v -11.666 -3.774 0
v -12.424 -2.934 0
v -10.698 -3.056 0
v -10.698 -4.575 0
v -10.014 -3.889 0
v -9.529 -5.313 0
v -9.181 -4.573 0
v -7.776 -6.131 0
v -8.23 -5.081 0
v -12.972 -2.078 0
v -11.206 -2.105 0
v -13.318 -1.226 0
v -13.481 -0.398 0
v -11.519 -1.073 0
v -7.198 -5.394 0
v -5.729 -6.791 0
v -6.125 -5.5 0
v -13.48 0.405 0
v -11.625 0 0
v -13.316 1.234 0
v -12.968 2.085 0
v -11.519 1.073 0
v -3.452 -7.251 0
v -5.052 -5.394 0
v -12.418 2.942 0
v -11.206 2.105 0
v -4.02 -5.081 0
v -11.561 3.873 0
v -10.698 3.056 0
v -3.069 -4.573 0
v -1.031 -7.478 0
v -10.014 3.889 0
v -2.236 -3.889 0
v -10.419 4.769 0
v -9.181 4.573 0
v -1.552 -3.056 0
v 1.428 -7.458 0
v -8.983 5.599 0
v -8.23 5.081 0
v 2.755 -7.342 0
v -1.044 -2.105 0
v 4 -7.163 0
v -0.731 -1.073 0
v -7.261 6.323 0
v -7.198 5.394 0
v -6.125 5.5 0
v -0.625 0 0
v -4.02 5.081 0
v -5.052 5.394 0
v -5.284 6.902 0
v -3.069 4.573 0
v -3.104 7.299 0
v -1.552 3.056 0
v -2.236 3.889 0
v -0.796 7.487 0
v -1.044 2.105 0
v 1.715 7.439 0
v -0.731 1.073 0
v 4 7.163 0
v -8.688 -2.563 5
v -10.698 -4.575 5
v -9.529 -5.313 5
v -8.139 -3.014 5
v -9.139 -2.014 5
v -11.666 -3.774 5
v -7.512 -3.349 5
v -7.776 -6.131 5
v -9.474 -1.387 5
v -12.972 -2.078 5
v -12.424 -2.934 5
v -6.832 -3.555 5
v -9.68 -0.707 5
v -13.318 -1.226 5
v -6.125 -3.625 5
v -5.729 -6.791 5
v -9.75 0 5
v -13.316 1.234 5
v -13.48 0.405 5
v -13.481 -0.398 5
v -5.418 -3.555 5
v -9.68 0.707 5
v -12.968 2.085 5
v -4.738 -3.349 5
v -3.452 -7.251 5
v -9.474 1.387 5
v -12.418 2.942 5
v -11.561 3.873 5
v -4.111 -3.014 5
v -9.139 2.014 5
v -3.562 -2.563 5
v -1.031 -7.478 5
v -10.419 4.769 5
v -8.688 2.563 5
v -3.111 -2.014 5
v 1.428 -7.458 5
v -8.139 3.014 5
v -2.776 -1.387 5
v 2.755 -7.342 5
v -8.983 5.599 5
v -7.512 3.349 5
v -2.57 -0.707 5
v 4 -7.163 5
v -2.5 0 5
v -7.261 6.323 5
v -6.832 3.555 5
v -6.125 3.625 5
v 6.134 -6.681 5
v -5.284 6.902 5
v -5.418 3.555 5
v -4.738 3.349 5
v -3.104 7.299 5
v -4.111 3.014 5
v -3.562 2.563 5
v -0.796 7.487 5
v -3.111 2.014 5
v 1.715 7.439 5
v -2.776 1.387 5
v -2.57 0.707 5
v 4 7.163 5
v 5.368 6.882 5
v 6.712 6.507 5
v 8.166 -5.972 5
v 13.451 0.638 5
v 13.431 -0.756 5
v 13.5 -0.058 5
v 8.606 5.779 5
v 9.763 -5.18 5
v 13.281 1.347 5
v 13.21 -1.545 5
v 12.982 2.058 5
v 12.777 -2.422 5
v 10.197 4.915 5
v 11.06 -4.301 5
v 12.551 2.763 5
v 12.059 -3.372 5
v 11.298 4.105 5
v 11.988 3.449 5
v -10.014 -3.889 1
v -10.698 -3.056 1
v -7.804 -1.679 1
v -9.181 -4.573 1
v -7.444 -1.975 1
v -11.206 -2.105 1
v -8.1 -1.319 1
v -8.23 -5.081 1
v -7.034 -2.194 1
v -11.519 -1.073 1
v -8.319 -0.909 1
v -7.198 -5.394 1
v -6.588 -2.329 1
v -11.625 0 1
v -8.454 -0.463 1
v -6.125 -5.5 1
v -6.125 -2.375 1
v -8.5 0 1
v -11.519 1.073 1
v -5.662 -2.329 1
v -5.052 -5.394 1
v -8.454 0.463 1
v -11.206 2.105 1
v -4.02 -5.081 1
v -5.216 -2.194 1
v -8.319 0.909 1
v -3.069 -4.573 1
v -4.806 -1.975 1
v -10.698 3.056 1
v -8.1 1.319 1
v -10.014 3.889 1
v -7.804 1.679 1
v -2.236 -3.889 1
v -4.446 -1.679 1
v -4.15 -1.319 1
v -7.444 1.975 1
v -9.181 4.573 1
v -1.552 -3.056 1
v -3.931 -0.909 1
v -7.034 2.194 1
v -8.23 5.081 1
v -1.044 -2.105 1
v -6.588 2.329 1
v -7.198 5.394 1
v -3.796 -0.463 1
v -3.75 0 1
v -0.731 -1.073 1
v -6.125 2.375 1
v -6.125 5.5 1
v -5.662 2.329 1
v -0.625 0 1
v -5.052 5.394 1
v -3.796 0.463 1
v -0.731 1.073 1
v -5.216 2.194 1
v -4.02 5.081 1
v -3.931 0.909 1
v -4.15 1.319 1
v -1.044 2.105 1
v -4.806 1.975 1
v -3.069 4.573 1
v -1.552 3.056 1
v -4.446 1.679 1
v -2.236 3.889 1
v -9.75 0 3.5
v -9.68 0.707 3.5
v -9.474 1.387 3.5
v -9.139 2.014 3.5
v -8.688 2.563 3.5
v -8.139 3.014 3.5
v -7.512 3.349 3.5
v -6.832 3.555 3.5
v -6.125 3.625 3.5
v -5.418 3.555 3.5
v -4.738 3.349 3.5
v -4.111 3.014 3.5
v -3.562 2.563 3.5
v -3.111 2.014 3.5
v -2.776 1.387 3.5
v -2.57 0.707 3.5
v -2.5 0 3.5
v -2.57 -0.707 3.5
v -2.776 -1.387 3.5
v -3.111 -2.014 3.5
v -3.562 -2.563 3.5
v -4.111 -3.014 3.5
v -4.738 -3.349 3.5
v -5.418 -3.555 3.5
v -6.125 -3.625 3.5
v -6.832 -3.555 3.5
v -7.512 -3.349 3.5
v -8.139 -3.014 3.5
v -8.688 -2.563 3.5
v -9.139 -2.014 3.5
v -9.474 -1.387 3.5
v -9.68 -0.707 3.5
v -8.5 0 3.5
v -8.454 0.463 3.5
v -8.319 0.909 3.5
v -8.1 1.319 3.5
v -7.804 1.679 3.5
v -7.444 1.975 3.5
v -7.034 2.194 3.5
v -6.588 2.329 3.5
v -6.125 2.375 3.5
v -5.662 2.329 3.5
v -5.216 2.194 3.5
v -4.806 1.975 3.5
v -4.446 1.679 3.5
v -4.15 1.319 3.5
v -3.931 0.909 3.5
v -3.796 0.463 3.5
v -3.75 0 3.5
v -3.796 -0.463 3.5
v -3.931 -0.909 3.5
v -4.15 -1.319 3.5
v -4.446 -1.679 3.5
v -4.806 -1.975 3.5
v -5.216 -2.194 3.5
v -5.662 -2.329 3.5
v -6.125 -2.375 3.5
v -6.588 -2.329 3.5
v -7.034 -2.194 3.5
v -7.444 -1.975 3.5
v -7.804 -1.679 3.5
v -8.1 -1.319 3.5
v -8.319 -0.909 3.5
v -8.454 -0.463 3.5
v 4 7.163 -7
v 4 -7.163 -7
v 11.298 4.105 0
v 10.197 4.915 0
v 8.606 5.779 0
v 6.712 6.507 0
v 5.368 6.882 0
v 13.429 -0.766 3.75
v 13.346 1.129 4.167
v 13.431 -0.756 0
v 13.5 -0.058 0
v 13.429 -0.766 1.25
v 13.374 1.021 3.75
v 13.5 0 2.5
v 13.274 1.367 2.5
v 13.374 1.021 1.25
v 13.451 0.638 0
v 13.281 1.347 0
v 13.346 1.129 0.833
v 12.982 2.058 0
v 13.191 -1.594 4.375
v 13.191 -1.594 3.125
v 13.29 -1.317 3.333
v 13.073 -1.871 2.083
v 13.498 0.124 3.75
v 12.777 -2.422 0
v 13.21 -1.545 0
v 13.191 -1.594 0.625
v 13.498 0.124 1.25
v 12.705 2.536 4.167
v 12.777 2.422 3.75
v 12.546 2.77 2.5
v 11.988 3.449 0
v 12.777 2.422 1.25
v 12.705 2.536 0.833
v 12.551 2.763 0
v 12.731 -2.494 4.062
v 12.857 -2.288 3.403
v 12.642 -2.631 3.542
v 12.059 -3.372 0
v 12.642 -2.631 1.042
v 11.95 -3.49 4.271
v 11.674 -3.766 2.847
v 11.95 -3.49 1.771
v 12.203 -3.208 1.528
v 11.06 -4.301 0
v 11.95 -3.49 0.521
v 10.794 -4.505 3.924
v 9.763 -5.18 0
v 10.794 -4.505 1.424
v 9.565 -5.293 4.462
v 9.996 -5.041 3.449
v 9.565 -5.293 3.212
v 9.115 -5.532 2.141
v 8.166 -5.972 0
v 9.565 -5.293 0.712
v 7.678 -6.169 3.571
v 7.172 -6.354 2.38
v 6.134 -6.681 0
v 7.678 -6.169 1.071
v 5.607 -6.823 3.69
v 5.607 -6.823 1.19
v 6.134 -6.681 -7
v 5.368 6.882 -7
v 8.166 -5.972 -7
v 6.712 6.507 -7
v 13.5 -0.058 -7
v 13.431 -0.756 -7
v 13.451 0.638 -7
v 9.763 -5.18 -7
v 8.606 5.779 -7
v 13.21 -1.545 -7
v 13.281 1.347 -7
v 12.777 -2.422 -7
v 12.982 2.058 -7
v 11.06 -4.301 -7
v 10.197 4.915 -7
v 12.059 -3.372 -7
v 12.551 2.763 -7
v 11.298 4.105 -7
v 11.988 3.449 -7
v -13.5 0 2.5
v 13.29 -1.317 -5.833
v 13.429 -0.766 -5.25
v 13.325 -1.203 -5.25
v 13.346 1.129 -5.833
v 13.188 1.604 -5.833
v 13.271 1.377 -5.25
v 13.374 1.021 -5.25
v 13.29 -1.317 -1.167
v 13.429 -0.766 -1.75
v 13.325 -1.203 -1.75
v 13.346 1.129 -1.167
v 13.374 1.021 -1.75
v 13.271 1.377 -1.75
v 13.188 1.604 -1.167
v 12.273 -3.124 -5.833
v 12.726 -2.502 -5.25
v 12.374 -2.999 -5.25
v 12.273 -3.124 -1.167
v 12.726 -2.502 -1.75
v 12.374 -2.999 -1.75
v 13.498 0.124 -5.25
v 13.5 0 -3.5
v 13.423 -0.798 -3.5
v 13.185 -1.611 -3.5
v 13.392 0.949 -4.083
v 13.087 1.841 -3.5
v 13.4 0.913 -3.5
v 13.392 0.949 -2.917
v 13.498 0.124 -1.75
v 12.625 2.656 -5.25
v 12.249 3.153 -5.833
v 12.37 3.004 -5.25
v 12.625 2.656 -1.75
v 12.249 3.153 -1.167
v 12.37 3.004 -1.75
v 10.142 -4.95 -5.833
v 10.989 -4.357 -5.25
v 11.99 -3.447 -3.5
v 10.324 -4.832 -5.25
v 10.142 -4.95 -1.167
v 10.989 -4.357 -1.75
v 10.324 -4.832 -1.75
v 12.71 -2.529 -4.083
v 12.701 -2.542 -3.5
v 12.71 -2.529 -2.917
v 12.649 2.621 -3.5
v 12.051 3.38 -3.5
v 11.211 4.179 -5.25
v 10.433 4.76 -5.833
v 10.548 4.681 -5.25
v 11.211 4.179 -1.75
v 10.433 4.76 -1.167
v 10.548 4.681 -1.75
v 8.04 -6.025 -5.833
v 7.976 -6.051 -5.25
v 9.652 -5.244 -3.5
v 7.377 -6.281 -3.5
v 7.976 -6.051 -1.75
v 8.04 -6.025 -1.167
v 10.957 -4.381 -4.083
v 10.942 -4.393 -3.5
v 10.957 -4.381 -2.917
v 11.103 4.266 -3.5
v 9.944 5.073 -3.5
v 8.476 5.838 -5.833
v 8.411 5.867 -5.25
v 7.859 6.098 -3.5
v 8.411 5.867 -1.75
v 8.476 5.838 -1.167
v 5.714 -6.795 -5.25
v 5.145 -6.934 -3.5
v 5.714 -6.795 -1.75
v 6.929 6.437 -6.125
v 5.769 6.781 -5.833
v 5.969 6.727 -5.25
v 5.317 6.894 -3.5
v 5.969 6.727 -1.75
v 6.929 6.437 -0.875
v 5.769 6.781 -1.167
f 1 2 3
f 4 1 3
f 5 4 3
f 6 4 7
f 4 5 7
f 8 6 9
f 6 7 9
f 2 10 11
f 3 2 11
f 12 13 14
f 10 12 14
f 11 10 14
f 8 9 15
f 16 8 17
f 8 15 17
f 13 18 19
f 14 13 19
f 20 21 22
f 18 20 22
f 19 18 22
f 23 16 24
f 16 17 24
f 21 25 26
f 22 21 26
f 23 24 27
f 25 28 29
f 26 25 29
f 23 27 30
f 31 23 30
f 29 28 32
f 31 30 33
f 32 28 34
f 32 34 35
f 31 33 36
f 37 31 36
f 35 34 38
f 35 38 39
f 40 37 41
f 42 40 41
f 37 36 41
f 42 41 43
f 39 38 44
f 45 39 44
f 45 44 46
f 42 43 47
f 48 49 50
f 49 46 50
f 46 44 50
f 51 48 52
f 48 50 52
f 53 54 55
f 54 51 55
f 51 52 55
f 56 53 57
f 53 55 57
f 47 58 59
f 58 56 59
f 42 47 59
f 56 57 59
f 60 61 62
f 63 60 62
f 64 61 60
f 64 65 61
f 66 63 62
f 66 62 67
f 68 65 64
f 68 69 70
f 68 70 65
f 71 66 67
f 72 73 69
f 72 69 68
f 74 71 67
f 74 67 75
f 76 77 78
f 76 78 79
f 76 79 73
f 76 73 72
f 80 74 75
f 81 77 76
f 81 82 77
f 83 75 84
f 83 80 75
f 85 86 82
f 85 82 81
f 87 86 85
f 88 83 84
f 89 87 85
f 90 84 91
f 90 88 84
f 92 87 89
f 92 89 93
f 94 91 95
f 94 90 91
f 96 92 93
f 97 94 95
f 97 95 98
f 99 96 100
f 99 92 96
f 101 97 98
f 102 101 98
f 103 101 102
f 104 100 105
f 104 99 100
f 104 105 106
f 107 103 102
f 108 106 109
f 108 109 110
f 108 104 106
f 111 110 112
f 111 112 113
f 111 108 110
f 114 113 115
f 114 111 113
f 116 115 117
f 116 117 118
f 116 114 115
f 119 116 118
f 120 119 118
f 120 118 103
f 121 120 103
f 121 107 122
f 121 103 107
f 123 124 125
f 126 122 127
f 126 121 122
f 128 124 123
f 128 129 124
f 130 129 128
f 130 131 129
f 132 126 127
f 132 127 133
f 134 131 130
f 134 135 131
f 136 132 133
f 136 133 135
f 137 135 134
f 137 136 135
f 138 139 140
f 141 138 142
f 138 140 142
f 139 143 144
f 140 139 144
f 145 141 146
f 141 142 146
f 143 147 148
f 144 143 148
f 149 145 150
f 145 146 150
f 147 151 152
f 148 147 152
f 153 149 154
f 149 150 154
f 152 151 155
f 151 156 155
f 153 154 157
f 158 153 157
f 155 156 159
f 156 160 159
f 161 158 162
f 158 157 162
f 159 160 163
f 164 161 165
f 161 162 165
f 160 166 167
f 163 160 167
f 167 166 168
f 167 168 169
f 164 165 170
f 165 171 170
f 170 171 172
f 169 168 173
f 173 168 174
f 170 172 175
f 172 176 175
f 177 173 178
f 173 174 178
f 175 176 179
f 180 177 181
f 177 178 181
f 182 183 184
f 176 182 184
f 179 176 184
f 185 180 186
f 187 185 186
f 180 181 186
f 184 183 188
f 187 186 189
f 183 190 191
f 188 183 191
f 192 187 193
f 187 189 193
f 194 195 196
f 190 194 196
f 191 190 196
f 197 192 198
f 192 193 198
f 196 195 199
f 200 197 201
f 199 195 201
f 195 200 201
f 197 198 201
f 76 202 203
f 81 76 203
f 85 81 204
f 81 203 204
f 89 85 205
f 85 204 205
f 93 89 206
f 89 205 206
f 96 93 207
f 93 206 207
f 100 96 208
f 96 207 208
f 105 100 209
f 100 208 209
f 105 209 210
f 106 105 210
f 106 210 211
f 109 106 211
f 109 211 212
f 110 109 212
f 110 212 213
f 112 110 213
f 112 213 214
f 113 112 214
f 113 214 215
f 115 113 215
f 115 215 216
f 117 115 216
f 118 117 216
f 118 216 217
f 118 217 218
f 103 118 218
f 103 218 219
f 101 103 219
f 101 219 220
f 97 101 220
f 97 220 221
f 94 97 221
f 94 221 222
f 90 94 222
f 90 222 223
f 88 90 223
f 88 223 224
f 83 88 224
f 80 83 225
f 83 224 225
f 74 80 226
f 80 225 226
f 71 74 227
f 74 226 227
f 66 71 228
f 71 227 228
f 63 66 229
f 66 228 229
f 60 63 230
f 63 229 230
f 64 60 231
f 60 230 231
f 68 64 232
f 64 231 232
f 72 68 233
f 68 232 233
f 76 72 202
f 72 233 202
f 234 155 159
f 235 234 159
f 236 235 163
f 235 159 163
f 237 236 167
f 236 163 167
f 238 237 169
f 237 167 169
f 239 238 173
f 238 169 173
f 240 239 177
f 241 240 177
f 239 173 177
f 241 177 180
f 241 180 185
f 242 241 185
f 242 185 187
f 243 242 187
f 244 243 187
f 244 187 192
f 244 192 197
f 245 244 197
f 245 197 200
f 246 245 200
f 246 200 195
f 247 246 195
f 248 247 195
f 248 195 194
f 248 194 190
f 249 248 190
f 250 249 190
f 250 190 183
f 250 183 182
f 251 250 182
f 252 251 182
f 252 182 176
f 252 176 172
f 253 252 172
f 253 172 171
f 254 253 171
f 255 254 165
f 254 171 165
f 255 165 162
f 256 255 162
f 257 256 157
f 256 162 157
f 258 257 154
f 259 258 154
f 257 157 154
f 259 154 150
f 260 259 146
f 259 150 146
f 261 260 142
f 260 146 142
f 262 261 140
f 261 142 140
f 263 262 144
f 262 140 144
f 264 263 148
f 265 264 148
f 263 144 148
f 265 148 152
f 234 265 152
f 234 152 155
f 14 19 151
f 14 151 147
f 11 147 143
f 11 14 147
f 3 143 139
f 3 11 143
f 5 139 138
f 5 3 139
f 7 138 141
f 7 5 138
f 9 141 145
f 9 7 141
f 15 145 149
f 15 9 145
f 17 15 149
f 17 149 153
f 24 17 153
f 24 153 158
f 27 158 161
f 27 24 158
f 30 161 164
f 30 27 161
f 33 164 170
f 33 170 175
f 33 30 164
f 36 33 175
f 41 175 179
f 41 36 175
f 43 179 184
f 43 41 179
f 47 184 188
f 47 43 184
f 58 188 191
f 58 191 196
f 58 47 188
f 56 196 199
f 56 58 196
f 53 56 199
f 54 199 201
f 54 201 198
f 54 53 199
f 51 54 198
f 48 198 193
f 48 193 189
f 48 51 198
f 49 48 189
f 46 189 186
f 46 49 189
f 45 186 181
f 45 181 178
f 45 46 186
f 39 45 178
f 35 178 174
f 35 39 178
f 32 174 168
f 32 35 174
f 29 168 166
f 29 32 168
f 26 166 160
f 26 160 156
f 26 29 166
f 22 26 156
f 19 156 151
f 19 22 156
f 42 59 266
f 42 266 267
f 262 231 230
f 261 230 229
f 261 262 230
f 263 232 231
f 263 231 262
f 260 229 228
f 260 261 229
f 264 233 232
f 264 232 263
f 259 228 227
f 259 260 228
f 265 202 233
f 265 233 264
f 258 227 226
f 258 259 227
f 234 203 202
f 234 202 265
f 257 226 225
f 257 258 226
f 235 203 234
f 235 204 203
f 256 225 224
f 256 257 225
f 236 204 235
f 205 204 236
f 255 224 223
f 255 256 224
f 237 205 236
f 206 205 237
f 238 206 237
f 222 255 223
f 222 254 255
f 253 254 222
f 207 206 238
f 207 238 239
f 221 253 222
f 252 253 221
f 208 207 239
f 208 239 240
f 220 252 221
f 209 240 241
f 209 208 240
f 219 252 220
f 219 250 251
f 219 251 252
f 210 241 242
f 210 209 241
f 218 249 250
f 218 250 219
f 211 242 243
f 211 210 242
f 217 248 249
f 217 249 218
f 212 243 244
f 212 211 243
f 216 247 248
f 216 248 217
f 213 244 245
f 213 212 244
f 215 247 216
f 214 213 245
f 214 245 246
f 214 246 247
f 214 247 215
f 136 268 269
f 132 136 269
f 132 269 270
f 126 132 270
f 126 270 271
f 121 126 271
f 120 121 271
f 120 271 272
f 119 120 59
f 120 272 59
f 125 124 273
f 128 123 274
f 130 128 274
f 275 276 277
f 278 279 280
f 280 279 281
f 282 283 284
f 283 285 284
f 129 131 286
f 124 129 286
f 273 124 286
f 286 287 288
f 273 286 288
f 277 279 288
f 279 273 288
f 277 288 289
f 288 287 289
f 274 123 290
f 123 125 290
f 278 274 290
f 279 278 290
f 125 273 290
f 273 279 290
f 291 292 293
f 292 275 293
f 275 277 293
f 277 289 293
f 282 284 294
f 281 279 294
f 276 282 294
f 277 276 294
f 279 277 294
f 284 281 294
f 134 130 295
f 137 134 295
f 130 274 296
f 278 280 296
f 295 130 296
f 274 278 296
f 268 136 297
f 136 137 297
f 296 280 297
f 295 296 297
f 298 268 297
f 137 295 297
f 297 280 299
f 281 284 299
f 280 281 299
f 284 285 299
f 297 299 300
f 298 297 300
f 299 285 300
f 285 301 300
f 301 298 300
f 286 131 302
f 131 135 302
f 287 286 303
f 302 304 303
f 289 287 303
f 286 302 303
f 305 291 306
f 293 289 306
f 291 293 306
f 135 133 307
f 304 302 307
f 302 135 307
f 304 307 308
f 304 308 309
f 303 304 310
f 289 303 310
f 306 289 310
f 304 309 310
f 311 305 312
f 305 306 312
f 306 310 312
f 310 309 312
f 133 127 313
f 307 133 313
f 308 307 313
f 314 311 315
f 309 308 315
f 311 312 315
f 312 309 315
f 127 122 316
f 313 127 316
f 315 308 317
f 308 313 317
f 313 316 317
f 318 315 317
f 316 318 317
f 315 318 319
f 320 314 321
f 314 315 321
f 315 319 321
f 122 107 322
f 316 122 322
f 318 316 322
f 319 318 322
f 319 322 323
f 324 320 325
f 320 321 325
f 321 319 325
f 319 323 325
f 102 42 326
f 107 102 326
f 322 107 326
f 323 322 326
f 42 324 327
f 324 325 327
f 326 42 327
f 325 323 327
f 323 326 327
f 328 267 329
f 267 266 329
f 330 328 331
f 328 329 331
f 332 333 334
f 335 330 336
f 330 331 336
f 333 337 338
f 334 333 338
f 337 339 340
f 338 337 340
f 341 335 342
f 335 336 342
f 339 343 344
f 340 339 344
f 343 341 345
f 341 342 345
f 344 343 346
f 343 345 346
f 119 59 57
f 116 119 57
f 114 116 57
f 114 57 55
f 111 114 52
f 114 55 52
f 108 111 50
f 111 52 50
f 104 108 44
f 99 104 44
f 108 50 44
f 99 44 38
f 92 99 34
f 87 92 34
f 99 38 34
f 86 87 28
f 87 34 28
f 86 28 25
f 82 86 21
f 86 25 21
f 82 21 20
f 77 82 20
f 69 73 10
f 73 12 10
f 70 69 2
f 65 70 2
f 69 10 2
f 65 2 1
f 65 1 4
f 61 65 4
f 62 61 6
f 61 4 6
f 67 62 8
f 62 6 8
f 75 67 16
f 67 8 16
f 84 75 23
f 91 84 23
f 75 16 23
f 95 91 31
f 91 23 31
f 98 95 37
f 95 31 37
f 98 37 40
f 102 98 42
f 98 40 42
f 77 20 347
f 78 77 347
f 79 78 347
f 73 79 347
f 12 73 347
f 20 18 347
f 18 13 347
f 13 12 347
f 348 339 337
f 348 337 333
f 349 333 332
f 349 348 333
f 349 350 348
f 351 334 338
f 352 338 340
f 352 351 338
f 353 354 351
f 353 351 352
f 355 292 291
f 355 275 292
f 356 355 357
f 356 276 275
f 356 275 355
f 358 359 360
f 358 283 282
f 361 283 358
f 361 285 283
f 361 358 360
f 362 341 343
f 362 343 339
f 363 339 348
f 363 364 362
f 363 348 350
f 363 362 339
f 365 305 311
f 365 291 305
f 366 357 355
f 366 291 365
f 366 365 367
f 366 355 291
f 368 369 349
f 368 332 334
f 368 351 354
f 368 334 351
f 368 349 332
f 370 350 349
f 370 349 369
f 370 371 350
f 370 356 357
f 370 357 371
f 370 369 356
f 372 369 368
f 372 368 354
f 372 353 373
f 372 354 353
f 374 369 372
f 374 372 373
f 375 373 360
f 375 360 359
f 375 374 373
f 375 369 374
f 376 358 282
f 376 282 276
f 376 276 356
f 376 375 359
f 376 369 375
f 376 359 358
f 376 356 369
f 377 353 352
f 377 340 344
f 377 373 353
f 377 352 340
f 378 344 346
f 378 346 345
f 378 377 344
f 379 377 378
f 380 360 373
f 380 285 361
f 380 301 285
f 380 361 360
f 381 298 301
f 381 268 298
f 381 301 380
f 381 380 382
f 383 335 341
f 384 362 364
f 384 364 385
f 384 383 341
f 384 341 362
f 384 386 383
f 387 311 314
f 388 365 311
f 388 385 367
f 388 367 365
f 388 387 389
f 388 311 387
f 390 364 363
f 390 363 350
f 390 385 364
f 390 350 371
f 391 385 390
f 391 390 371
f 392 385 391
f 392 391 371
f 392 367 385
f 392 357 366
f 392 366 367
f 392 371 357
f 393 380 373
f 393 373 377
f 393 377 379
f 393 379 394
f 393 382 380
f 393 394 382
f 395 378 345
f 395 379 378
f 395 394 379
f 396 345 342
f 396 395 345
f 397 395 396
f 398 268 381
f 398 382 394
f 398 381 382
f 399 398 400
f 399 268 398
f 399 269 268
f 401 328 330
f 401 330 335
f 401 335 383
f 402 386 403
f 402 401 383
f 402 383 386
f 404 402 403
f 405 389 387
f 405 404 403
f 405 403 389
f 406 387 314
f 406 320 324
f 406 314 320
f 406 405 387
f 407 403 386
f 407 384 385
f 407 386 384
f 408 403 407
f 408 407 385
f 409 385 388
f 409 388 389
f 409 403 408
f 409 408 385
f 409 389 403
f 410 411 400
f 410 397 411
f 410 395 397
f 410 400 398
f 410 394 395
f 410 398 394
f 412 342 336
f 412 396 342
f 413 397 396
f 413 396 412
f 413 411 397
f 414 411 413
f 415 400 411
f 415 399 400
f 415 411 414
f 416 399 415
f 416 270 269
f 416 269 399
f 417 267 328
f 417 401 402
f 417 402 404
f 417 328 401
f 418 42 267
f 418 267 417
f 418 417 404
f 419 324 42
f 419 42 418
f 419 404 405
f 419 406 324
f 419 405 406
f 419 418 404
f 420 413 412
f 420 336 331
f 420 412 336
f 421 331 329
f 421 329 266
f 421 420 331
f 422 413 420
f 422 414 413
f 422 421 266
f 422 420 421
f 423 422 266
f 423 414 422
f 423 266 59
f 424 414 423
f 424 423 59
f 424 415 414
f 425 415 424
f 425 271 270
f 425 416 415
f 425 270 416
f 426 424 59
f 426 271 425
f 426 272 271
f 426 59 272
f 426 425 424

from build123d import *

# Parameters (mm, degrees)
F1_DEPTH = 5
F2_DEPTH = 3.5
F3_DEPTH = 7
F4_DEPTH = 1


with BuildPart() as f1:
    # F0 (on Top) → F1 (new body)
    with BuildSketch(Plane.XY):
        with BuildLine():
            Line((4, -7.1632205323), (4, 7.1632205323))
            add(Edge.make_bspline(
                [(4, 7.1632205323), (-13.5, 10.1793133881), (-13.5, 0)],
                knots=[1.2699838515, 1.2699838515, 1.2699838515, 3.1415926536, 3.1415926536, 3.1415926536], degree=2, weights=[1, 0.593171014, 1]))
            add(Edge.make_bspline(
                [(-13.5, 0), (-13.5, -10.1793133881), (4, -7.1632205323)],
                knots=[3.1415926536, 3.1415926536, 3.1415926536, 5.0132014556, 5.0132014556, 5.0132014556], degree=2, weights=[1, 0.593171014, 1]))
        make_face()
        with BuildLine():
            ThreePointArc((-0.625, 0), (-6.125, -5.5), (-11.625, 0))
            ThreePointArc((-11.625, 0), (-6.125, 5.5), (-0.625, 0))
        make_face(mode=Mode.SUBTRACT)
        with BuildLine():
            add(Edge.make_bspline(
                [(4, -7.1632205323), (13.5, -5.5259129821), (13.5, 0)],
                knots=[5.0132014556, 5.0132014556, 5.0132014556, 6.2831853072, 6.2831853072, 6.2831853072], degree=2, weights=[1, 0.8050764859, 1]))
            add(Edge.make_bspline(
                [(13.5, 0), (13.5, 5.5259129821), (4, 7.1632205323)],
                knots=[0, 0, 0, 1.2699838515, 1.2699838515, 1.2699838515], degree=2, weights=[1, 0.8050764859, 1]))
            Line((4, 7.1632205323), (4, -7.1632205323))
        make_face()
        with BuildLine():
            ThreePointArc((-0.625, 0), (-6.125, 5.5), (-11.625, 0))
            ThreePointArc((-11.625, 0), (-6.125, -5.5), (-0.625, 0))
        make_face()
        with BuildLine():
            ThreePointArc((-2.5, 0), (-6.125, -3.625), (-9.75, 0))
            ThreePointArc((-9.75, 0), (-6.125, 3.625), (-2.5, 0))
        make_face(mode=Mode.SUBTRACT)
    extrude(amount=F1_DEPTH)

    # F0 (on Top) → F2 (join)
    with BuildSketch(Plane.XY):
        with BuildLine():
            ThreePointArc((-2.5, 0), (-6.125, 3.625), (-9.75, 0))
            ThreePointArc((-9.75, 0), (-6.125, -3.625), (-2.5, 0))
        make_face()
        with BuildLine():
            ThreePointArc((-3.75, 0), (-6.125, -2.375), (-8.5, 0))
            ThreePointArc((-8.5, 0), (-6.125, 2.375), (-3.75, 0))
        make_face(mode=Mode.SUBTRACT)
    extrude(amount=F2_DEPTH)

    # F0 (on Top) → F3 (join)
    with BuildSketch(Plane.XY):
        with BuildLine():
            add(Edge.make_bspline(
                [(4, -7.1632205323), (13.5, -5.5259129821), (13.5, 0)],
                knots=[5.0132014556, 5.0132014556, 5.0132014556, 6.2831853072, 6.2831853072, 6.2831853072], degree=2, weights=[1, 0.8050764859, 1]))
            add(Edge.make_bspline(
                [(13.5, 0), (13.5, 5.5259129821), (4, 7.1632205323)],
                knots=[0, 0, 0, 1.2699838515, 1.2699838515, 1.2699838515], degree=2, weights=[1, 0.8050764859, 1]))
            Line((4, 7.1632205323), (4, -7.1632205323))
        make_face()
    extrude(amount=-F3_DEPTH)

    # F0 (on Top) → F4 (cut)
    with BuildSketch(Plane.XY):
        with BuildLine():
            ThreePointArc((-0.625, 0), (-6.125, 5.5), (-11.625, 0))
            ThreePointArc((-11.625, 0), (-6.125, -5.5), (-0.625, 0))
        make_face()
        with BuildLine():
            ThreePointArc((-2.5, 0), (-6.125, -3.625), (-9.75, 0))
            ThreePointArc((-9.75, 0), (-6.125, 3.625), (-2.5, 0))
        make_face(mode=Mode.SUBTRACT)
        with BuildLine():
            ThreePointArc((-2.5, 0), (-6.125, 3.625), (-9.75, 0))
            ThreePointArc((-9.75, 0), (-6.125, -3.625), (-2.5, 0))
        make_face()
        with BuildLine():
            ThreePointArc((-3.75, 0), (-6.125, -2.375), (-8.5, 0))
            ThreePointArc((-8.5, 0), (-6.125, 2.375), (-3.75, 0))
        make_face(mode=Mode.SUBTRACT)
    extrude(amount=F4_DEPTH, mode=Mode.SUBTRACT)


solid = f1.part
